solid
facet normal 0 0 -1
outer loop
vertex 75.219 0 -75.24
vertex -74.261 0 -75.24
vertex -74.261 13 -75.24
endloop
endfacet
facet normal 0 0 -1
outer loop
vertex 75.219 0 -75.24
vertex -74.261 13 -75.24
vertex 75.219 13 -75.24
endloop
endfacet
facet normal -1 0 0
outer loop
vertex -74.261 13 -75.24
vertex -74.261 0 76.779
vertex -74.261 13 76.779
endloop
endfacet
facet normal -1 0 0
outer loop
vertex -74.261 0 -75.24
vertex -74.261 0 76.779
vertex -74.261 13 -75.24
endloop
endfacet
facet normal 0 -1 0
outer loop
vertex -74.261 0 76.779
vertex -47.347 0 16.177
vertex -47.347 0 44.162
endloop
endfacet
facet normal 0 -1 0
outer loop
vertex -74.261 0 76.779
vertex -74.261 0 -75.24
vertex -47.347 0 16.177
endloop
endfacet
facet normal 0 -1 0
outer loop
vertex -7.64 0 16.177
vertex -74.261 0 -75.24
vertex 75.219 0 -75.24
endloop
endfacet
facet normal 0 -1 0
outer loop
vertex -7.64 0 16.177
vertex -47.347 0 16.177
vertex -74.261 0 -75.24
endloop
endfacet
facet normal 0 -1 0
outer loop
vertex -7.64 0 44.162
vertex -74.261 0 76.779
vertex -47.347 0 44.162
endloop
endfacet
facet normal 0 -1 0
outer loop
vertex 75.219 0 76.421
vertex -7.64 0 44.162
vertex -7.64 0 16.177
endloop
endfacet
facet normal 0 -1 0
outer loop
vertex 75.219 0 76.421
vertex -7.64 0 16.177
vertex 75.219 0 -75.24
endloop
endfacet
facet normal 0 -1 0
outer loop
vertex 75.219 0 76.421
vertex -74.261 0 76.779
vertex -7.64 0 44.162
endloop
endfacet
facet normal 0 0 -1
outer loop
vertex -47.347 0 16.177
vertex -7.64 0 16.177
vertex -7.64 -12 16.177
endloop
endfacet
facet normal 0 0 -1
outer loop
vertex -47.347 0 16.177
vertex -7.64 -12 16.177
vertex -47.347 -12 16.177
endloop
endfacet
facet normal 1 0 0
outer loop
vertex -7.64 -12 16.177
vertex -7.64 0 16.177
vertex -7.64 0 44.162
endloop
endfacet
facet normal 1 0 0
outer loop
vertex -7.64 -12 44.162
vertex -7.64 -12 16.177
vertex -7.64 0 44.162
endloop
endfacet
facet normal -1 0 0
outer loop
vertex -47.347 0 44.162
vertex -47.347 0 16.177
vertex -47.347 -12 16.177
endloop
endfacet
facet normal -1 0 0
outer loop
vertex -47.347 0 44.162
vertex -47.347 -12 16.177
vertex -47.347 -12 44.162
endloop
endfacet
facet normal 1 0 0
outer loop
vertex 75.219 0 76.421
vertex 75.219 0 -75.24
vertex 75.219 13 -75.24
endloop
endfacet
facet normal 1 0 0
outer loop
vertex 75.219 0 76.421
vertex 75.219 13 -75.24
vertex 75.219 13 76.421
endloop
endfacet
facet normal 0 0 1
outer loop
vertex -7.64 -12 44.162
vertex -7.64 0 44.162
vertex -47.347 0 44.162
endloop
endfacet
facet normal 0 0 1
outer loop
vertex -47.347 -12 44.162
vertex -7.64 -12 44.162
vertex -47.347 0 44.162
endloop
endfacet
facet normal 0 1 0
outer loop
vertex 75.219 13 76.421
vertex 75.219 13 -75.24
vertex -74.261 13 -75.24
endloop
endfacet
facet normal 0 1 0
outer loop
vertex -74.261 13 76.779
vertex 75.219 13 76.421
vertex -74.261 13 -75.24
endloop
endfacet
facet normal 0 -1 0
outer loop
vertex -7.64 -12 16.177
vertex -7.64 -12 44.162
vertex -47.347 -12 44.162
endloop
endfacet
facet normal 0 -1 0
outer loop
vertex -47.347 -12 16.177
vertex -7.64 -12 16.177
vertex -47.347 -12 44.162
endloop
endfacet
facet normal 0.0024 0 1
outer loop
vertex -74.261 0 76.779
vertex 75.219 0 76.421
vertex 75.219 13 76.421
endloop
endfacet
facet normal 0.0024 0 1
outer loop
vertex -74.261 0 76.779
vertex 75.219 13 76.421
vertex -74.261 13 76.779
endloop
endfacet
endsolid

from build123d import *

# Parameters (mm, degrees)
F1_DEPTH = 13
F4_W     = 39.5263805985
F4_H     = 30.6198559701
F5_DEPTH = 12
F3_W     = 39.7066194564
F3_H     = 27.9853120446
F6_DEPTH = 25


with BuildPart() as f1:
    # F0 (on Front) → F1 (new body)
    with BuildSketch(Plane.XZ):
        Polygon((75.2189680934, 76.4205157757), (-74.2607861757, 76.778665185), (-74.2607861757, -75.2398595214), (75.2189680934, -75.2398595214), align=None)
    extrude(amount=-F1_DEPTH)

    # F4 (on face) → F5 (join)
    with BuildSketch(Plane.XZ):
        with Locations((24.8862691224, 28.5907592624)):
            Rectangle(F4_W, F4_H)
    extrude(amount=-F5_DEPTH)

    # F3 (on face) → F6 (join)
    with BuildSketch(Plane(origin=(0, 13, 0), x_dir=(-1, 0, 0), z_dir=(0, 1, 0))):
        with Locations((27.4936407804, 30.1694050431)):
            Rectangle(F3_W, F3_H)
    extrude(amount=-F6_DEPTH)


solid = f1.part
